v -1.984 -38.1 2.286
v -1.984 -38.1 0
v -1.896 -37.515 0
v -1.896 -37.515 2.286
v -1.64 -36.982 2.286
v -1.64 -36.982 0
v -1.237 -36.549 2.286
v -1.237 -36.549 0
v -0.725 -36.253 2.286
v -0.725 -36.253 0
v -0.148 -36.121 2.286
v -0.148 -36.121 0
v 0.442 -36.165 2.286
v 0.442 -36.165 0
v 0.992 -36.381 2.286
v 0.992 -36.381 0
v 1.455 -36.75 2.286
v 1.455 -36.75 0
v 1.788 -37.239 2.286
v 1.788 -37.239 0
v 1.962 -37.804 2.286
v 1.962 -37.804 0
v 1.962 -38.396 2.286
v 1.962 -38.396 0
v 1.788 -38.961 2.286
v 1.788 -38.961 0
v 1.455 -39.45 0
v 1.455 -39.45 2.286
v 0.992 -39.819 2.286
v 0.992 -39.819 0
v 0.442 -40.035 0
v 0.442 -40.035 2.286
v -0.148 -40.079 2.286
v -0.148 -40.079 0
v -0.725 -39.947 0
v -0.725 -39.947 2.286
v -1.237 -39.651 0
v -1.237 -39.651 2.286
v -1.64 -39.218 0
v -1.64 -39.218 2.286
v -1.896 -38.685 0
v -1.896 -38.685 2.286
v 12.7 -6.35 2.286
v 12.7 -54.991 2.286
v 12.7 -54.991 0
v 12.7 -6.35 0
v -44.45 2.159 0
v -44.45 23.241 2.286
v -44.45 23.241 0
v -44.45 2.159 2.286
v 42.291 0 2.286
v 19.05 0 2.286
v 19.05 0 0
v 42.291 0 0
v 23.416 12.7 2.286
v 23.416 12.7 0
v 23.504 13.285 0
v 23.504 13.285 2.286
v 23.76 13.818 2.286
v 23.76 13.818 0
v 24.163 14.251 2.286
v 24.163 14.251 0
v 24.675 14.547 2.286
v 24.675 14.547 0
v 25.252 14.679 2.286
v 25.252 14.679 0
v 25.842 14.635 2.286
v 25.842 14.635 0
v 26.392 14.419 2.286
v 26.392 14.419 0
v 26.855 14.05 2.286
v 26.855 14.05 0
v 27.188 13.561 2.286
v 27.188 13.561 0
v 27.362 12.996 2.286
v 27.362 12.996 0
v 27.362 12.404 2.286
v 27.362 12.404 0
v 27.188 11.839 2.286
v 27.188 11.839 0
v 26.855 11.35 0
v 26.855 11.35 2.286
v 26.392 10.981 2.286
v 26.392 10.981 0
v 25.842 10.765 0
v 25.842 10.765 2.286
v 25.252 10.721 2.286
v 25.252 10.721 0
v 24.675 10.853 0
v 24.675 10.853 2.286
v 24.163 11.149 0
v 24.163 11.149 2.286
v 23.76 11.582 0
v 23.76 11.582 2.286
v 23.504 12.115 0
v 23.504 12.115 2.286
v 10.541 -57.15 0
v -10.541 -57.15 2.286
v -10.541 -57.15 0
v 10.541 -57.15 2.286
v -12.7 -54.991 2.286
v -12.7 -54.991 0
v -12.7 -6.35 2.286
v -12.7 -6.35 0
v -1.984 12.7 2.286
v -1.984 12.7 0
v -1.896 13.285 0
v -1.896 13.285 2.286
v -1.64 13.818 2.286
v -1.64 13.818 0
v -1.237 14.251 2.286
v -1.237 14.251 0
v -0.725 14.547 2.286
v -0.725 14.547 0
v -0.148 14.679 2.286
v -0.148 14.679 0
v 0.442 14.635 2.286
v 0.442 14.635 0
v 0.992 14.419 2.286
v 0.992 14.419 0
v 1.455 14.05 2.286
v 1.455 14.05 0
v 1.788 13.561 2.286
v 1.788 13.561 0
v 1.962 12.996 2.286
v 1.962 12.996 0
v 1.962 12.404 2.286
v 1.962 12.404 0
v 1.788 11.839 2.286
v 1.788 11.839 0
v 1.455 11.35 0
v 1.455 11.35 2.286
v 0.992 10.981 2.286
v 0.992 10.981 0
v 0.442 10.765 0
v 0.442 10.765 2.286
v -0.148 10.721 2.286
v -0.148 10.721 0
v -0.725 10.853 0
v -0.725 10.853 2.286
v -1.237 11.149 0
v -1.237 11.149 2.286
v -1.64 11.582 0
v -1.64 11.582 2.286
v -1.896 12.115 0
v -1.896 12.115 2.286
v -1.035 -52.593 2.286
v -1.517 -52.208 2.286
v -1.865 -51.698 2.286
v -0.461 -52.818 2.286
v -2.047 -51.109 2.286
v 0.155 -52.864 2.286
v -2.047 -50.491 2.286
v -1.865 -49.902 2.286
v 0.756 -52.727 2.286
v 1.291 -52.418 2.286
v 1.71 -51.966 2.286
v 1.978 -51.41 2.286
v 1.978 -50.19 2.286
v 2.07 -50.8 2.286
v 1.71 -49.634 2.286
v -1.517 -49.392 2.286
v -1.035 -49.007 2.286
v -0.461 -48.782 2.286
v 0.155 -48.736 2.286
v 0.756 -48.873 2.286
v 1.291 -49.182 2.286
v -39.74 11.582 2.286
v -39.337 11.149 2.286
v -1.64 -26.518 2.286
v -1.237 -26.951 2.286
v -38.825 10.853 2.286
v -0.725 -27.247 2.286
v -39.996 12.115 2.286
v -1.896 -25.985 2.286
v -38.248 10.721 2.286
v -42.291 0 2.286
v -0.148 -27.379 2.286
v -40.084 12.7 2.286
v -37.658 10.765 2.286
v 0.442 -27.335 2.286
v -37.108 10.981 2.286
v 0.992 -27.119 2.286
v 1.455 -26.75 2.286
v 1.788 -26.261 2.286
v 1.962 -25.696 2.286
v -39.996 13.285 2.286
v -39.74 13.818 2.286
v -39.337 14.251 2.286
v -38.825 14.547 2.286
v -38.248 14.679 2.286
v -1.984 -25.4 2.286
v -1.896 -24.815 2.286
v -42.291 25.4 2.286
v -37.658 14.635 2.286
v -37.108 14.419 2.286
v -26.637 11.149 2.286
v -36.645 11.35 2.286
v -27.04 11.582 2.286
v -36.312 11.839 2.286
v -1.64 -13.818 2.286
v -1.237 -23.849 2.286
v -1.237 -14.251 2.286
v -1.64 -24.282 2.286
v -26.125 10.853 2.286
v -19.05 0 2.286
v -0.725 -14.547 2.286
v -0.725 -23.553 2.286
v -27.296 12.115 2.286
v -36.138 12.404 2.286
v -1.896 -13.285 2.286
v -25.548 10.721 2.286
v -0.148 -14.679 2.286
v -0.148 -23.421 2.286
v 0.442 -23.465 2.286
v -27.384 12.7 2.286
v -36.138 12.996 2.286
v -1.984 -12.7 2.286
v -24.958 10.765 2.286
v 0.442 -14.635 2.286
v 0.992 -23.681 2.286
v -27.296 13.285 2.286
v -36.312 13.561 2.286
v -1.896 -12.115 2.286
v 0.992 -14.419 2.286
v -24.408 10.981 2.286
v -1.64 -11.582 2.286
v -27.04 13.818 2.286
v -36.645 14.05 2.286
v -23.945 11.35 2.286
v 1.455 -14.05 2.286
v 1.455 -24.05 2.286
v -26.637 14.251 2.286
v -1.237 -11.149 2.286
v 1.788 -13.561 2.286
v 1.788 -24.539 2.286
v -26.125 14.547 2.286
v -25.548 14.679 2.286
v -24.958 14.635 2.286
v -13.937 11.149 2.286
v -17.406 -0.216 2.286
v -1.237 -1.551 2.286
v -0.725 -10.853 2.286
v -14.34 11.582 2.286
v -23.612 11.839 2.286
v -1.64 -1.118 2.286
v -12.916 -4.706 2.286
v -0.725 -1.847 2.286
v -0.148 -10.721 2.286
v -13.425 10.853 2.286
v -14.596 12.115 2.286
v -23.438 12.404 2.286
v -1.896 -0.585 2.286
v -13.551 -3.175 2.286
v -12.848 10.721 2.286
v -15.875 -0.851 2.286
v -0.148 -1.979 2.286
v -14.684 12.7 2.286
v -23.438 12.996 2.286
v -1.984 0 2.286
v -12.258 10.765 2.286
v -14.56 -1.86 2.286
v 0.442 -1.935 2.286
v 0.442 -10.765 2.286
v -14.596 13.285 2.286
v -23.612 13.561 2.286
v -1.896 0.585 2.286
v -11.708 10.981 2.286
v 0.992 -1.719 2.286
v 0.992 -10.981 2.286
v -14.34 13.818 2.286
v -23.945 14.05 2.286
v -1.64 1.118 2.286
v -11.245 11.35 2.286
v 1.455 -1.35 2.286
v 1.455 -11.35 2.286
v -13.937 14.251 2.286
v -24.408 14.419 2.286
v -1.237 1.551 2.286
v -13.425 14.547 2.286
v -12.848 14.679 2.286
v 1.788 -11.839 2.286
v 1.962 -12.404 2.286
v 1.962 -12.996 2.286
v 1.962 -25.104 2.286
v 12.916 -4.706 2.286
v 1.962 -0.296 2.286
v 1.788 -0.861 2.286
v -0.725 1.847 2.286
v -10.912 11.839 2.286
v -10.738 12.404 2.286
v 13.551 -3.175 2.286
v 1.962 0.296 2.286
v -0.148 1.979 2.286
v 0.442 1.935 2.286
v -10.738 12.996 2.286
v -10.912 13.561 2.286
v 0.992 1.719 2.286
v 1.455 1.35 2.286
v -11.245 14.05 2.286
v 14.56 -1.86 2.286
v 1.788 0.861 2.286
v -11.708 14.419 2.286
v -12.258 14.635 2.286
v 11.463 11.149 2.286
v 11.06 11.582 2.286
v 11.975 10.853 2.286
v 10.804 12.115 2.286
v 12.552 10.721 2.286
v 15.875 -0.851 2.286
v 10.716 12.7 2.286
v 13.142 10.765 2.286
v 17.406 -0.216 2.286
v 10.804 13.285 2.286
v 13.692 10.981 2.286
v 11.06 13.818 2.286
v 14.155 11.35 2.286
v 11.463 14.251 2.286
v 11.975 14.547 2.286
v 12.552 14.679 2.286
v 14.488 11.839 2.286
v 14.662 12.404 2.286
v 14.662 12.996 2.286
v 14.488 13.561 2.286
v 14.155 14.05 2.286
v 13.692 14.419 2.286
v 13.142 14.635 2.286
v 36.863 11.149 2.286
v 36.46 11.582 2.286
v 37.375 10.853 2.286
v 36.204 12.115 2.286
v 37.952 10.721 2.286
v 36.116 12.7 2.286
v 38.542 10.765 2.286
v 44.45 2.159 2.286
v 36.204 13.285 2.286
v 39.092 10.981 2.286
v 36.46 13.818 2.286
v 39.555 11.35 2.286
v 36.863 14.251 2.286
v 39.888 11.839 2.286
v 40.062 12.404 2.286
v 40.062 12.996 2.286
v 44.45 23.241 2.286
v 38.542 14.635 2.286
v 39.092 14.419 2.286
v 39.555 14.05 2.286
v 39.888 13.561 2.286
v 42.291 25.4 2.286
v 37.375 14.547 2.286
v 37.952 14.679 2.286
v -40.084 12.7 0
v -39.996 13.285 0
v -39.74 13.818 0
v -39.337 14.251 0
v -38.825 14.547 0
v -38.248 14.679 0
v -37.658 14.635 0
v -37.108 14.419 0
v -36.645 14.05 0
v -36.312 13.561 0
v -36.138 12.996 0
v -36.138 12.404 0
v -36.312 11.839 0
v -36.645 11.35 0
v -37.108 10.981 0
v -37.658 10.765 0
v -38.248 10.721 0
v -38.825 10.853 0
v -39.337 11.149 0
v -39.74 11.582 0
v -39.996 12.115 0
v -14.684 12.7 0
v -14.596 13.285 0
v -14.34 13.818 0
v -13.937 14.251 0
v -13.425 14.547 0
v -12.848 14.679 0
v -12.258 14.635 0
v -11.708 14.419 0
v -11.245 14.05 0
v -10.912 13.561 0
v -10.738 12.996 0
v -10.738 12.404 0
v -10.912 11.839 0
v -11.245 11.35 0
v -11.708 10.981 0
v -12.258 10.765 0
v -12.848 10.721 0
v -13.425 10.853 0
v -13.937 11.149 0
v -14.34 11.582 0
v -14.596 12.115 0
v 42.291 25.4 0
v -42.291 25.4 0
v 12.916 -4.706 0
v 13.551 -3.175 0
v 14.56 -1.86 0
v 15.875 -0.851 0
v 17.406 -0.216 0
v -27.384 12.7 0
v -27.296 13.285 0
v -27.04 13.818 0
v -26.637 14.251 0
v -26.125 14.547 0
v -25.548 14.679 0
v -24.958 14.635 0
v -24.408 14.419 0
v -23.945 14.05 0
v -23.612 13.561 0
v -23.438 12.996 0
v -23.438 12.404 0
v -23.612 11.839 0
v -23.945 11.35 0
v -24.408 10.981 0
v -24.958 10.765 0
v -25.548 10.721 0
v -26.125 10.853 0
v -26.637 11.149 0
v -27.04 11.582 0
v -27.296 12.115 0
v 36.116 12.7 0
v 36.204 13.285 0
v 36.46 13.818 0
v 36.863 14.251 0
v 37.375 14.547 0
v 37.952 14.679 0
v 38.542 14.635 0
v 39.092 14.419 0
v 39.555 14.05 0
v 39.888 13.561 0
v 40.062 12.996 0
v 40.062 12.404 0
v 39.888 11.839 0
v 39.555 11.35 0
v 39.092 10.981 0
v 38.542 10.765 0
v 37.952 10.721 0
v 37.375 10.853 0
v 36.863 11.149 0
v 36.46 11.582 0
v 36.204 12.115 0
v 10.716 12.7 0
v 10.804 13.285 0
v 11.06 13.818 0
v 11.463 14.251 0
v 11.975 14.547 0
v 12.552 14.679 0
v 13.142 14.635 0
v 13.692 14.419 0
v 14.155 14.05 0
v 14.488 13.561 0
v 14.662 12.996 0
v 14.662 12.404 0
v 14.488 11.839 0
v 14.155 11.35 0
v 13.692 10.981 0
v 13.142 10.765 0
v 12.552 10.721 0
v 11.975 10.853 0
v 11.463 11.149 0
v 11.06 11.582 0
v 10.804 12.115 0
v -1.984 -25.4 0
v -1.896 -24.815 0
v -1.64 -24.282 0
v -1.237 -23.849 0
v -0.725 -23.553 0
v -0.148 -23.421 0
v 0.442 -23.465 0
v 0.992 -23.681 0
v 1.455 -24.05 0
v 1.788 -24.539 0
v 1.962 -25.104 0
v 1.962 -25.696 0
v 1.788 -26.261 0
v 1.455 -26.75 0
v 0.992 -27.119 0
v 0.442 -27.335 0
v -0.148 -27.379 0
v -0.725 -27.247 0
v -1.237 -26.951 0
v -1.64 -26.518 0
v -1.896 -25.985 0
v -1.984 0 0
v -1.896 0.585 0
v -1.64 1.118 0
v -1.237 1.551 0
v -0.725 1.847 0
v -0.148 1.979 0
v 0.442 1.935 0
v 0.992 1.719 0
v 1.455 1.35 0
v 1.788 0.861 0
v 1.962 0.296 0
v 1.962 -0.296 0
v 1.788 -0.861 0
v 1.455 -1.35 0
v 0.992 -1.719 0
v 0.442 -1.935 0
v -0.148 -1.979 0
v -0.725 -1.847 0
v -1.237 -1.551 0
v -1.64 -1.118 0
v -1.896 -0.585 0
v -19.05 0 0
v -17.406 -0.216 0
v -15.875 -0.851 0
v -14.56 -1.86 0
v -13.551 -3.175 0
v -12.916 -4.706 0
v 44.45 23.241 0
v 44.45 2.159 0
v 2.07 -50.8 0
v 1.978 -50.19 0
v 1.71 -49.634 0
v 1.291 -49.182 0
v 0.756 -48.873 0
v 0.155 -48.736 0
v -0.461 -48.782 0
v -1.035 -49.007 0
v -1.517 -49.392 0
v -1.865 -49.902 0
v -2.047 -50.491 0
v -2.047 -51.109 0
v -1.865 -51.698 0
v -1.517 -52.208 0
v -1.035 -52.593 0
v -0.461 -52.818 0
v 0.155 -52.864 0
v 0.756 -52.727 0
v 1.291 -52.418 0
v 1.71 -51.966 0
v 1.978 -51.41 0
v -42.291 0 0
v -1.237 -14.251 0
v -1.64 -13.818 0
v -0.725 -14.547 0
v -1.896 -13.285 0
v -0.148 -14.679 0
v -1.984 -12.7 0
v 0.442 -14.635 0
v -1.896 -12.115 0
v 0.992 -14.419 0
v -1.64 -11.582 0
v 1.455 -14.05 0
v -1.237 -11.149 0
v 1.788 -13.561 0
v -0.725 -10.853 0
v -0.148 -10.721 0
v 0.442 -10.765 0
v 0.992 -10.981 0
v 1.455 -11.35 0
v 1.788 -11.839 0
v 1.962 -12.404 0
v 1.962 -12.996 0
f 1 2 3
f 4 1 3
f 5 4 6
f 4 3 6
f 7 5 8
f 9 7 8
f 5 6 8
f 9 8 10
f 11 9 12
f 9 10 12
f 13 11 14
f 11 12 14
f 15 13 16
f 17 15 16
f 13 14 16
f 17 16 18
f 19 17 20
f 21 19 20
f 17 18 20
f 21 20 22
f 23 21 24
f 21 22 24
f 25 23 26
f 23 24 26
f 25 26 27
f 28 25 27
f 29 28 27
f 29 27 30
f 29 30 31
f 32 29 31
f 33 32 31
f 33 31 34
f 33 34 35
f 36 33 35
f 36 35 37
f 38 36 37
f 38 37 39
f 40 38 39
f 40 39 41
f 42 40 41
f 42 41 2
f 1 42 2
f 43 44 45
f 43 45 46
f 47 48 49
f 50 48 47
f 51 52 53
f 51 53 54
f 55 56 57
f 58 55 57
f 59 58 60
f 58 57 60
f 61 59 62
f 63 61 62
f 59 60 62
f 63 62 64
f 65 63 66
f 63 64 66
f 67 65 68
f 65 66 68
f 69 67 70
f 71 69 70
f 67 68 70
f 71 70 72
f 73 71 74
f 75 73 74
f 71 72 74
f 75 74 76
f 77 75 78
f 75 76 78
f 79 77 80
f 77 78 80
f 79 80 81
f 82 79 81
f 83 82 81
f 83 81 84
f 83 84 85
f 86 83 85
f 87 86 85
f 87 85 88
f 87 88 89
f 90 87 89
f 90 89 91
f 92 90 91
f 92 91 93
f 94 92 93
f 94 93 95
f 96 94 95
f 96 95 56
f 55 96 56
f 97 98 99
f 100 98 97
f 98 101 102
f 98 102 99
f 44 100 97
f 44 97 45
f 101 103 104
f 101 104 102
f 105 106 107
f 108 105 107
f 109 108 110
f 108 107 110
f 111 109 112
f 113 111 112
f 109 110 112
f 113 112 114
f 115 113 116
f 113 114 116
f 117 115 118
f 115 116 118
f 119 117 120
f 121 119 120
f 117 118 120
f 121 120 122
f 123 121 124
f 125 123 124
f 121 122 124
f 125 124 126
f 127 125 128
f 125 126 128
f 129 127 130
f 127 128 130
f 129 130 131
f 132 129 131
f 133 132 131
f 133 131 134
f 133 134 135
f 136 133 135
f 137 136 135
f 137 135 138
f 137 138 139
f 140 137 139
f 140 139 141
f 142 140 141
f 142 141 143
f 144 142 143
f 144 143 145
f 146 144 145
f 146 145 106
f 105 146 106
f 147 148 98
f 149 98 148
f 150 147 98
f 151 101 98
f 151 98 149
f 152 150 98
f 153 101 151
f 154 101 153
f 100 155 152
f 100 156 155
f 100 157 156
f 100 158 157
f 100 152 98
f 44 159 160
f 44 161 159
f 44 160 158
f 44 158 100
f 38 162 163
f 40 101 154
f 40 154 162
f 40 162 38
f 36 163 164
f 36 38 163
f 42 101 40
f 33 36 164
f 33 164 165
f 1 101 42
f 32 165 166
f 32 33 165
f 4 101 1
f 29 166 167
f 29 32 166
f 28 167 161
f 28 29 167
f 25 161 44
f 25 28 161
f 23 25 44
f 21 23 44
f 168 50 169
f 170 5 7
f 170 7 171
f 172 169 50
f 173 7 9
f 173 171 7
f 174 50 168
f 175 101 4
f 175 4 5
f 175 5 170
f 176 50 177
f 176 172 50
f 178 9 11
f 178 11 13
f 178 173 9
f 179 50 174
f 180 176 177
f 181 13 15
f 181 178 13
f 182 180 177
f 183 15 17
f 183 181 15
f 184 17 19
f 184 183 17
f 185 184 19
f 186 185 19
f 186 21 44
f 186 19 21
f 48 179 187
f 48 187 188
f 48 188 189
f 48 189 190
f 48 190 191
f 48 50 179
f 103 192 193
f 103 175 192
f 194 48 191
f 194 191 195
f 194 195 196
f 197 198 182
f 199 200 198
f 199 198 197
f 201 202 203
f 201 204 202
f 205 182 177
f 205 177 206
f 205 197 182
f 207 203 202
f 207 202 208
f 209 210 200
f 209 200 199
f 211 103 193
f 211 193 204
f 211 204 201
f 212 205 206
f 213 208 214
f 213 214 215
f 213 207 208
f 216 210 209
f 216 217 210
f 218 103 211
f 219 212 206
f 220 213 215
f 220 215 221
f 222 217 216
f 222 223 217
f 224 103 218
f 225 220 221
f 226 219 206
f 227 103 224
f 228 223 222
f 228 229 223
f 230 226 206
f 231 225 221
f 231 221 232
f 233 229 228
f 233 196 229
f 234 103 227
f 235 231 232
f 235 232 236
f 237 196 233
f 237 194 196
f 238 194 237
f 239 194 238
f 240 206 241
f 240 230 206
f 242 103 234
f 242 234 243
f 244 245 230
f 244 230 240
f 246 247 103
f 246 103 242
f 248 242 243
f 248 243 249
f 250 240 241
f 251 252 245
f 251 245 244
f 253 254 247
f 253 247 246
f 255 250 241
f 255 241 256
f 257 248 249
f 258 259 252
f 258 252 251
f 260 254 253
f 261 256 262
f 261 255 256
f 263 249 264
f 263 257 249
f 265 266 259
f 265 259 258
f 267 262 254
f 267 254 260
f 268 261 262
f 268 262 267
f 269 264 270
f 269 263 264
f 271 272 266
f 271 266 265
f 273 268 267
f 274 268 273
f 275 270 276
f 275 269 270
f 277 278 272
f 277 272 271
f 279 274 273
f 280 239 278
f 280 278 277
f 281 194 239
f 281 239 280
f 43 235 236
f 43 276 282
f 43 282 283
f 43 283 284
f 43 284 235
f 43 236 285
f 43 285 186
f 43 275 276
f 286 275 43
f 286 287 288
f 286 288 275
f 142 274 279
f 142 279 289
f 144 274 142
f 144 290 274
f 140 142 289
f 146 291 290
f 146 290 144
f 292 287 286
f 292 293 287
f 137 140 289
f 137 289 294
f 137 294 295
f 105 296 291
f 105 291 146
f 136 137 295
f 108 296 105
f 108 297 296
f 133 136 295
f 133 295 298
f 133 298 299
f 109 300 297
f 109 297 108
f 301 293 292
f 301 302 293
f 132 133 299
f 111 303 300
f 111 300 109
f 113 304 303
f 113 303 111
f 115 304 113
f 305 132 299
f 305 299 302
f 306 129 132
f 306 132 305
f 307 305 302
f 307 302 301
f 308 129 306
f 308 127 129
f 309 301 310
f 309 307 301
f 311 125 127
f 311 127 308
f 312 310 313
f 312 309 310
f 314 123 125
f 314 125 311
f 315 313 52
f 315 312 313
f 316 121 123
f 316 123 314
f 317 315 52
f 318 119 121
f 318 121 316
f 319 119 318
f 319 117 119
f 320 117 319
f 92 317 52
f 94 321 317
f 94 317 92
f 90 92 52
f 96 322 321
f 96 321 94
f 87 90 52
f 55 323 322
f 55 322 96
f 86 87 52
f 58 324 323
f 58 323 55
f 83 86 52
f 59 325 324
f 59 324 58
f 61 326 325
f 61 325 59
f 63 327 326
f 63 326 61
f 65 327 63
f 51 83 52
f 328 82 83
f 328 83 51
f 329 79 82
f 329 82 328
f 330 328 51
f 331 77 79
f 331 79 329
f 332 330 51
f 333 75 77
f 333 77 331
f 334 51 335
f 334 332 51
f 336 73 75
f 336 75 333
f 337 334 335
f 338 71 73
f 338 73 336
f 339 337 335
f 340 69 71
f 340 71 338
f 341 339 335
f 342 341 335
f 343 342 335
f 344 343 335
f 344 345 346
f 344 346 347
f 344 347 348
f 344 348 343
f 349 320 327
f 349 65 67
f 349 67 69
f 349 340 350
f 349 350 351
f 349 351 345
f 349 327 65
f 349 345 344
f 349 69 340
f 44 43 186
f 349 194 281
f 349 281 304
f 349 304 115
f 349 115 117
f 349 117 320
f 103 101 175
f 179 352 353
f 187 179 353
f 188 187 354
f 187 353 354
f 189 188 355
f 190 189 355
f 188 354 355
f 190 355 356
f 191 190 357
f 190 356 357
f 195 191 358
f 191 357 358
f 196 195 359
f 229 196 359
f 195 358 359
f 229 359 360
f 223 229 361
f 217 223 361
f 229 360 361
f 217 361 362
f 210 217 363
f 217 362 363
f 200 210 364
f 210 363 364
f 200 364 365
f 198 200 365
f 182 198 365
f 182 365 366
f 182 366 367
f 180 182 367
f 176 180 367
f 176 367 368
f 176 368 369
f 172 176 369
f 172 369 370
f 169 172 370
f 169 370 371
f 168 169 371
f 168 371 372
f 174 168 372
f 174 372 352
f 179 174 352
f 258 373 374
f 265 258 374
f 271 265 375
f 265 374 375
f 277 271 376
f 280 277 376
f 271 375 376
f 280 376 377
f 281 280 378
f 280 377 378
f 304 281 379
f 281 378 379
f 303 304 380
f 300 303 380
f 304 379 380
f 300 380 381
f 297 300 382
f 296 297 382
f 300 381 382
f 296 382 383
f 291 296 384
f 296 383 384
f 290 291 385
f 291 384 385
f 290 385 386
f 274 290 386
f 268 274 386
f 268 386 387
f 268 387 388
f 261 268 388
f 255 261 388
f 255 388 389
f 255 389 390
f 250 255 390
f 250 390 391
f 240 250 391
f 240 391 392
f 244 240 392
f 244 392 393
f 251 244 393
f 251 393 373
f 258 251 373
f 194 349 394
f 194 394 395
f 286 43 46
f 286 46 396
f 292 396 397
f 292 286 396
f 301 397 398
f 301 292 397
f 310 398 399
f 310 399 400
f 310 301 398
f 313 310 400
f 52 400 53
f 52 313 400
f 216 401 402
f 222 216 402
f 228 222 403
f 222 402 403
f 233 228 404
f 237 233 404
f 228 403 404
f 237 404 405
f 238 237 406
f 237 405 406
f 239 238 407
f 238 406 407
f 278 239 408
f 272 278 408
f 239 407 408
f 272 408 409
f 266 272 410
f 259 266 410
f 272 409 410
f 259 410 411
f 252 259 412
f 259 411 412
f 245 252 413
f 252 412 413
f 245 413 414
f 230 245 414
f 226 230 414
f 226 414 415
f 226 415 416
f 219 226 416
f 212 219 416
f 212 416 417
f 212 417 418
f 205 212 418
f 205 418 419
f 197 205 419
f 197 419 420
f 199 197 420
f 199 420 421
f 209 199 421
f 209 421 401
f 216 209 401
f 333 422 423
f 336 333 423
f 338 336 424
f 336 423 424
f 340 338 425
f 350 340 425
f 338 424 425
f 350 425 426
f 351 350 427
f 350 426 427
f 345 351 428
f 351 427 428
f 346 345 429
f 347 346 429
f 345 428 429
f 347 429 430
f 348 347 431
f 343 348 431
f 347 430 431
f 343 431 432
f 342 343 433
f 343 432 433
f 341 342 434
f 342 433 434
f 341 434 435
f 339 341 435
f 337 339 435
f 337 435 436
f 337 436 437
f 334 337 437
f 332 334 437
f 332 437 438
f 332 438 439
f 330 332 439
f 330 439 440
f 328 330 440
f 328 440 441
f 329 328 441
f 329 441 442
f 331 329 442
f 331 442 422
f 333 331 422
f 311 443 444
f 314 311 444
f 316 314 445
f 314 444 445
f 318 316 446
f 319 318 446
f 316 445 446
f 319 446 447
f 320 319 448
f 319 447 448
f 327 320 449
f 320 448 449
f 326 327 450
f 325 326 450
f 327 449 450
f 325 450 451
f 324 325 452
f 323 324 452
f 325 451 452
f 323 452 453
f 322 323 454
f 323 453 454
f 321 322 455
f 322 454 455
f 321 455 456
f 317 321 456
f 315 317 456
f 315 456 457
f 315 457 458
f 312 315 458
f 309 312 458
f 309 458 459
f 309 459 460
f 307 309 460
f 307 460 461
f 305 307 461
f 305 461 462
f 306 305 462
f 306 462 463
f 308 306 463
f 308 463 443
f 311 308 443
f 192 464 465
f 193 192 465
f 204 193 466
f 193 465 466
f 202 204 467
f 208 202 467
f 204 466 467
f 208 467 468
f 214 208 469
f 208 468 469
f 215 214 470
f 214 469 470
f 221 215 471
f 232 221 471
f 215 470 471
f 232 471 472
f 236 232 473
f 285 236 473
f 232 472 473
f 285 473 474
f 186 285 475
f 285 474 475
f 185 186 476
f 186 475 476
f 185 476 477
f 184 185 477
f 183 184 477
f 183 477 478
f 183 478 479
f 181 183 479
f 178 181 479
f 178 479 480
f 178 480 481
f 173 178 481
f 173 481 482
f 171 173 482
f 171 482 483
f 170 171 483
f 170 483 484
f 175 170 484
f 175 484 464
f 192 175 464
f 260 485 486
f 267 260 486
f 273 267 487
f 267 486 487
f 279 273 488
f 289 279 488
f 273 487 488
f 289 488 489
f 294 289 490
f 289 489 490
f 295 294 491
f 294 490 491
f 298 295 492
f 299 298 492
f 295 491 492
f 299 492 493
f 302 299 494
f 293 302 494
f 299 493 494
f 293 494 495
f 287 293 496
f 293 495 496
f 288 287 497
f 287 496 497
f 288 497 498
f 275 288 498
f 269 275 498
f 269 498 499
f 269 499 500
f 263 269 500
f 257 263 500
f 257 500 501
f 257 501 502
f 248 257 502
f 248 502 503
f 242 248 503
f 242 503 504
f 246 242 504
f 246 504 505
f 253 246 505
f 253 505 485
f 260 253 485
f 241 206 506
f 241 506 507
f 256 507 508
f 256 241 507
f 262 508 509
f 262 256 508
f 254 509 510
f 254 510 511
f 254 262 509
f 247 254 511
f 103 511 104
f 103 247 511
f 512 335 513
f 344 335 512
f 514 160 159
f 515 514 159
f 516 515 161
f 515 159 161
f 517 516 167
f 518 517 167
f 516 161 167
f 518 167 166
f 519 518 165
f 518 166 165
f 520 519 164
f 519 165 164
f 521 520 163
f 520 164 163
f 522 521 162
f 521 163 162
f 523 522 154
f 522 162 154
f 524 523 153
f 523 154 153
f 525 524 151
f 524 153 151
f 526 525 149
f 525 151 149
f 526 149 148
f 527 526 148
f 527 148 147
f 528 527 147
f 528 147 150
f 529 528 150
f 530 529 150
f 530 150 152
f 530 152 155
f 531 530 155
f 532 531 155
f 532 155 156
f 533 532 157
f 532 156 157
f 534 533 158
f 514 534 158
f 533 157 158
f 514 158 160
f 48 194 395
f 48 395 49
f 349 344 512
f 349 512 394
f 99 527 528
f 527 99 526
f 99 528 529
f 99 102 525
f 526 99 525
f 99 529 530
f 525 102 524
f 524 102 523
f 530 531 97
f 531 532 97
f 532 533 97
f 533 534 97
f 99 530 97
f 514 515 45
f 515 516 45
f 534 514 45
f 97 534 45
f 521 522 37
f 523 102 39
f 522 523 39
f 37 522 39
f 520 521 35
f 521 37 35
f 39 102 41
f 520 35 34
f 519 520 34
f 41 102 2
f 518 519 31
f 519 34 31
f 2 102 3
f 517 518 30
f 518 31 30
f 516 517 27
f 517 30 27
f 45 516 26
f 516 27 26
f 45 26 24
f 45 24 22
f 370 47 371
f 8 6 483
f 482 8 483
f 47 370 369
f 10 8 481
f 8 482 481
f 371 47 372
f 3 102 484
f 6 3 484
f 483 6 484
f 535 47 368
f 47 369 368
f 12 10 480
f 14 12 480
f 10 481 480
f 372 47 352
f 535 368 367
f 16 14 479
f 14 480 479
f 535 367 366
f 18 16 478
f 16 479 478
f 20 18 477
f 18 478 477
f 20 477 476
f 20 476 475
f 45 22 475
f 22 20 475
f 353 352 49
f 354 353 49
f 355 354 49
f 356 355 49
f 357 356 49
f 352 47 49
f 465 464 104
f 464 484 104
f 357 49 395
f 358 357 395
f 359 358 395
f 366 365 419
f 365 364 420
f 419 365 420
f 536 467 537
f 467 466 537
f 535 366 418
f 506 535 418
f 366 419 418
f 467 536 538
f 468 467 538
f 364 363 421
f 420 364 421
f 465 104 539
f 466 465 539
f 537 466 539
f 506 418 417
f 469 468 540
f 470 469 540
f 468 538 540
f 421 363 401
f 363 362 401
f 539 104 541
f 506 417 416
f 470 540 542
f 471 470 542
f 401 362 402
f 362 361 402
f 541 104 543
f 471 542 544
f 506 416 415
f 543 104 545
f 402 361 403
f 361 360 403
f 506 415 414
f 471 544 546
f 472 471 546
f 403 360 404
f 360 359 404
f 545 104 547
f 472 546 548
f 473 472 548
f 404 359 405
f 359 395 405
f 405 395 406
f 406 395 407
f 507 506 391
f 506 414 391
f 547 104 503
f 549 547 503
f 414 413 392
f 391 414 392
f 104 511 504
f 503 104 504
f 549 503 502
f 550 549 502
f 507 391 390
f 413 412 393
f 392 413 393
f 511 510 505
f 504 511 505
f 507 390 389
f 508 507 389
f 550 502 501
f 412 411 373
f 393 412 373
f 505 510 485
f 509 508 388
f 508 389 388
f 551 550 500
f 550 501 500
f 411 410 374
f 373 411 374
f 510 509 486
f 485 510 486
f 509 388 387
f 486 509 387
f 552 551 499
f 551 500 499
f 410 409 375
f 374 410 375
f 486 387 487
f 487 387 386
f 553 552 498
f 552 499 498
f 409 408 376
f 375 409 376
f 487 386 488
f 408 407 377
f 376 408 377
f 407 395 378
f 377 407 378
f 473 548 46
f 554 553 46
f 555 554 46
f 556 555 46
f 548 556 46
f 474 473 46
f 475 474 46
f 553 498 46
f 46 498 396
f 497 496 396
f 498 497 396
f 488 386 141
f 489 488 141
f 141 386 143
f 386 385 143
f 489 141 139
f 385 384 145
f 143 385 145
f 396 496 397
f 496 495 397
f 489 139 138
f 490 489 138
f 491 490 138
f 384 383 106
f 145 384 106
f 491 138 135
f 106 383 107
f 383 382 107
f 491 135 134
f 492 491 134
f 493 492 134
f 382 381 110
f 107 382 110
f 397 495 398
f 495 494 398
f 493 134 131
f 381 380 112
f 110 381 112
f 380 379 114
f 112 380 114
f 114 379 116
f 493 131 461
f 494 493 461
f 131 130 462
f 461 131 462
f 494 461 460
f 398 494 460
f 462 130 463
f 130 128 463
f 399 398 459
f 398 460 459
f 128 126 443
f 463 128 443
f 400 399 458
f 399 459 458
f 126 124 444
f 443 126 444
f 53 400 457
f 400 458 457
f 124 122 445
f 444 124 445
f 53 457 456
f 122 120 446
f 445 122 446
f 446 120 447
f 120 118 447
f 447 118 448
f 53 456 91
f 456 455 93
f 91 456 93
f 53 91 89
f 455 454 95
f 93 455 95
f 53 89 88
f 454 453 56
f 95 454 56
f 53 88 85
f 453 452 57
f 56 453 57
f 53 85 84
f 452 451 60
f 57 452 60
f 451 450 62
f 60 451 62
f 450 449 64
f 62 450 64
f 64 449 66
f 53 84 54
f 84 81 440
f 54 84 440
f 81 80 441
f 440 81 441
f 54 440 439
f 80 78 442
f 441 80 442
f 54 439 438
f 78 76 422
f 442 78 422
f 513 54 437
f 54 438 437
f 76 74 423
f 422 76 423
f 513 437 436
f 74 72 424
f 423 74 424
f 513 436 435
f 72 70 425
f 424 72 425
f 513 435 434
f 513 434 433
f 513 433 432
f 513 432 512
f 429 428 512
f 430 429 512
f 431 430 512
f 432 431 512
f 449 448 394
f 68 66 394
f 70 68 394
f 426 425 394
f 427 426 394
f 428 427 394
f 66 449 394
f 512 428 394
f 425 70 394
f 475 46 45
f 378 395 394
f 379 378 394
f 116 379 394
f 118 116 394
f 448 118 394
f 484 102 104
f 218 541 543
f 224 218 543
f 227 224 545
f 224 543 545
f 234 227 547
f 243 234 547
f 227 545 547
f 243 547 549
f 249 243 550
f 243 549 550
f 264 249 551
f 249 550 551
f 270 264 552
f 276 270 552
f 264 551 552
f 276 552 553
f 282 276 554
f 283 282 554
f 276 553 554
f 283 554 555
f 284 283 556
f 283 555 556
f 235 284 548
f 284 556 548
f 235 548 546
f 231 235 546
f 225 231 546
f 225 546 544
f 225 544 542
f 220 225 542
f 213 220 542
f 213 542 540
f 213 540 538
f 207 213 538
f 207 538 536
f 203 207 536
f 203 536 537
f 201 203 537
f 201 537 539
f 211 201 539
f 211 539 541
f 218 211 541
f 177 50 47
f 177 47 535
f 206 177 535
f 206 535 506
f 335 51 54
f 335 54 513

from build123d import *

# Parameters (mm, degrees)
SKETCH1_R                       = 2.0701
BOSS_EXTRUDE1_DEPTH             = 2.286
F_5_32_0_15625_DIAMETER_HOLE1_D = 3.96875


with BuildPart() as part:
    # Sketch1 → Boss-Extrude1 (new body)
    with BuildSketch(Plane.XY.offset(2.286)):
        with BuildLine():
            Line((12.7, -54.991), (12.7, -6.35))
            ThreePointArc((12.7, -6.35), (14.559871939, -1.859871939), (19.05, 0))
            Line((19.05, 0), (42.291, 0))
            Line((42.291, 0), (44.45, 2.159))
            Line((44.45, 2.159), (44.45, 23.241))
            Line((44.45, 23.241), (42.291, 25.4))
            Line((42.291, 25.4), (-42.291, 25.4))
            Line((-42.291, 25.4), (-44.45, 23.241))
            Line((-44.45, 23.241), (-44.45, 2.159))
            Line((-44.45, 2.159), (-42.291, 0))
            Line((-42.291, 0), (-19.05, 0))
            ThreePointArc((-19.05, 0), (-14.559871939, -1.859871939), (-12.7, -6.35))
            Line((-12.7, -6.35), (-12.7, -54.991))
            Line((-12.7, -54.991), (-10.541, -57.15))
            Line((-10.541, -57.15), (10.541, -57.15))
            Line((10.541, -57.15), (12.7, -54.991))
        make_face()
        with Locations((0, -50.8)):
            Circle(SKETCH1_R, mode=Mode.SUBTRACT)
    extrude(amount=-BOSS_EXTRUDE1_DEPTH)

    # 5/32 (0.15625) Diameter Hole1 (through all)
    with Locations(Plane.XY.offset(2.286)):
        with Locations((-38.1, 12.7), (-25.4, 12.7), (-12.7, 12.7), (0, 12.7), (12.7, 12.7), (25.4, 12.7), (38.1, 12.7), (0, 0), (0, -12.7), (0, -25.4), (0, -38.1), (0, -50.8)):
            Hole(F_5_32_0_15625_DIAMETER_HOLE1_D / 2)


solid = part.part
